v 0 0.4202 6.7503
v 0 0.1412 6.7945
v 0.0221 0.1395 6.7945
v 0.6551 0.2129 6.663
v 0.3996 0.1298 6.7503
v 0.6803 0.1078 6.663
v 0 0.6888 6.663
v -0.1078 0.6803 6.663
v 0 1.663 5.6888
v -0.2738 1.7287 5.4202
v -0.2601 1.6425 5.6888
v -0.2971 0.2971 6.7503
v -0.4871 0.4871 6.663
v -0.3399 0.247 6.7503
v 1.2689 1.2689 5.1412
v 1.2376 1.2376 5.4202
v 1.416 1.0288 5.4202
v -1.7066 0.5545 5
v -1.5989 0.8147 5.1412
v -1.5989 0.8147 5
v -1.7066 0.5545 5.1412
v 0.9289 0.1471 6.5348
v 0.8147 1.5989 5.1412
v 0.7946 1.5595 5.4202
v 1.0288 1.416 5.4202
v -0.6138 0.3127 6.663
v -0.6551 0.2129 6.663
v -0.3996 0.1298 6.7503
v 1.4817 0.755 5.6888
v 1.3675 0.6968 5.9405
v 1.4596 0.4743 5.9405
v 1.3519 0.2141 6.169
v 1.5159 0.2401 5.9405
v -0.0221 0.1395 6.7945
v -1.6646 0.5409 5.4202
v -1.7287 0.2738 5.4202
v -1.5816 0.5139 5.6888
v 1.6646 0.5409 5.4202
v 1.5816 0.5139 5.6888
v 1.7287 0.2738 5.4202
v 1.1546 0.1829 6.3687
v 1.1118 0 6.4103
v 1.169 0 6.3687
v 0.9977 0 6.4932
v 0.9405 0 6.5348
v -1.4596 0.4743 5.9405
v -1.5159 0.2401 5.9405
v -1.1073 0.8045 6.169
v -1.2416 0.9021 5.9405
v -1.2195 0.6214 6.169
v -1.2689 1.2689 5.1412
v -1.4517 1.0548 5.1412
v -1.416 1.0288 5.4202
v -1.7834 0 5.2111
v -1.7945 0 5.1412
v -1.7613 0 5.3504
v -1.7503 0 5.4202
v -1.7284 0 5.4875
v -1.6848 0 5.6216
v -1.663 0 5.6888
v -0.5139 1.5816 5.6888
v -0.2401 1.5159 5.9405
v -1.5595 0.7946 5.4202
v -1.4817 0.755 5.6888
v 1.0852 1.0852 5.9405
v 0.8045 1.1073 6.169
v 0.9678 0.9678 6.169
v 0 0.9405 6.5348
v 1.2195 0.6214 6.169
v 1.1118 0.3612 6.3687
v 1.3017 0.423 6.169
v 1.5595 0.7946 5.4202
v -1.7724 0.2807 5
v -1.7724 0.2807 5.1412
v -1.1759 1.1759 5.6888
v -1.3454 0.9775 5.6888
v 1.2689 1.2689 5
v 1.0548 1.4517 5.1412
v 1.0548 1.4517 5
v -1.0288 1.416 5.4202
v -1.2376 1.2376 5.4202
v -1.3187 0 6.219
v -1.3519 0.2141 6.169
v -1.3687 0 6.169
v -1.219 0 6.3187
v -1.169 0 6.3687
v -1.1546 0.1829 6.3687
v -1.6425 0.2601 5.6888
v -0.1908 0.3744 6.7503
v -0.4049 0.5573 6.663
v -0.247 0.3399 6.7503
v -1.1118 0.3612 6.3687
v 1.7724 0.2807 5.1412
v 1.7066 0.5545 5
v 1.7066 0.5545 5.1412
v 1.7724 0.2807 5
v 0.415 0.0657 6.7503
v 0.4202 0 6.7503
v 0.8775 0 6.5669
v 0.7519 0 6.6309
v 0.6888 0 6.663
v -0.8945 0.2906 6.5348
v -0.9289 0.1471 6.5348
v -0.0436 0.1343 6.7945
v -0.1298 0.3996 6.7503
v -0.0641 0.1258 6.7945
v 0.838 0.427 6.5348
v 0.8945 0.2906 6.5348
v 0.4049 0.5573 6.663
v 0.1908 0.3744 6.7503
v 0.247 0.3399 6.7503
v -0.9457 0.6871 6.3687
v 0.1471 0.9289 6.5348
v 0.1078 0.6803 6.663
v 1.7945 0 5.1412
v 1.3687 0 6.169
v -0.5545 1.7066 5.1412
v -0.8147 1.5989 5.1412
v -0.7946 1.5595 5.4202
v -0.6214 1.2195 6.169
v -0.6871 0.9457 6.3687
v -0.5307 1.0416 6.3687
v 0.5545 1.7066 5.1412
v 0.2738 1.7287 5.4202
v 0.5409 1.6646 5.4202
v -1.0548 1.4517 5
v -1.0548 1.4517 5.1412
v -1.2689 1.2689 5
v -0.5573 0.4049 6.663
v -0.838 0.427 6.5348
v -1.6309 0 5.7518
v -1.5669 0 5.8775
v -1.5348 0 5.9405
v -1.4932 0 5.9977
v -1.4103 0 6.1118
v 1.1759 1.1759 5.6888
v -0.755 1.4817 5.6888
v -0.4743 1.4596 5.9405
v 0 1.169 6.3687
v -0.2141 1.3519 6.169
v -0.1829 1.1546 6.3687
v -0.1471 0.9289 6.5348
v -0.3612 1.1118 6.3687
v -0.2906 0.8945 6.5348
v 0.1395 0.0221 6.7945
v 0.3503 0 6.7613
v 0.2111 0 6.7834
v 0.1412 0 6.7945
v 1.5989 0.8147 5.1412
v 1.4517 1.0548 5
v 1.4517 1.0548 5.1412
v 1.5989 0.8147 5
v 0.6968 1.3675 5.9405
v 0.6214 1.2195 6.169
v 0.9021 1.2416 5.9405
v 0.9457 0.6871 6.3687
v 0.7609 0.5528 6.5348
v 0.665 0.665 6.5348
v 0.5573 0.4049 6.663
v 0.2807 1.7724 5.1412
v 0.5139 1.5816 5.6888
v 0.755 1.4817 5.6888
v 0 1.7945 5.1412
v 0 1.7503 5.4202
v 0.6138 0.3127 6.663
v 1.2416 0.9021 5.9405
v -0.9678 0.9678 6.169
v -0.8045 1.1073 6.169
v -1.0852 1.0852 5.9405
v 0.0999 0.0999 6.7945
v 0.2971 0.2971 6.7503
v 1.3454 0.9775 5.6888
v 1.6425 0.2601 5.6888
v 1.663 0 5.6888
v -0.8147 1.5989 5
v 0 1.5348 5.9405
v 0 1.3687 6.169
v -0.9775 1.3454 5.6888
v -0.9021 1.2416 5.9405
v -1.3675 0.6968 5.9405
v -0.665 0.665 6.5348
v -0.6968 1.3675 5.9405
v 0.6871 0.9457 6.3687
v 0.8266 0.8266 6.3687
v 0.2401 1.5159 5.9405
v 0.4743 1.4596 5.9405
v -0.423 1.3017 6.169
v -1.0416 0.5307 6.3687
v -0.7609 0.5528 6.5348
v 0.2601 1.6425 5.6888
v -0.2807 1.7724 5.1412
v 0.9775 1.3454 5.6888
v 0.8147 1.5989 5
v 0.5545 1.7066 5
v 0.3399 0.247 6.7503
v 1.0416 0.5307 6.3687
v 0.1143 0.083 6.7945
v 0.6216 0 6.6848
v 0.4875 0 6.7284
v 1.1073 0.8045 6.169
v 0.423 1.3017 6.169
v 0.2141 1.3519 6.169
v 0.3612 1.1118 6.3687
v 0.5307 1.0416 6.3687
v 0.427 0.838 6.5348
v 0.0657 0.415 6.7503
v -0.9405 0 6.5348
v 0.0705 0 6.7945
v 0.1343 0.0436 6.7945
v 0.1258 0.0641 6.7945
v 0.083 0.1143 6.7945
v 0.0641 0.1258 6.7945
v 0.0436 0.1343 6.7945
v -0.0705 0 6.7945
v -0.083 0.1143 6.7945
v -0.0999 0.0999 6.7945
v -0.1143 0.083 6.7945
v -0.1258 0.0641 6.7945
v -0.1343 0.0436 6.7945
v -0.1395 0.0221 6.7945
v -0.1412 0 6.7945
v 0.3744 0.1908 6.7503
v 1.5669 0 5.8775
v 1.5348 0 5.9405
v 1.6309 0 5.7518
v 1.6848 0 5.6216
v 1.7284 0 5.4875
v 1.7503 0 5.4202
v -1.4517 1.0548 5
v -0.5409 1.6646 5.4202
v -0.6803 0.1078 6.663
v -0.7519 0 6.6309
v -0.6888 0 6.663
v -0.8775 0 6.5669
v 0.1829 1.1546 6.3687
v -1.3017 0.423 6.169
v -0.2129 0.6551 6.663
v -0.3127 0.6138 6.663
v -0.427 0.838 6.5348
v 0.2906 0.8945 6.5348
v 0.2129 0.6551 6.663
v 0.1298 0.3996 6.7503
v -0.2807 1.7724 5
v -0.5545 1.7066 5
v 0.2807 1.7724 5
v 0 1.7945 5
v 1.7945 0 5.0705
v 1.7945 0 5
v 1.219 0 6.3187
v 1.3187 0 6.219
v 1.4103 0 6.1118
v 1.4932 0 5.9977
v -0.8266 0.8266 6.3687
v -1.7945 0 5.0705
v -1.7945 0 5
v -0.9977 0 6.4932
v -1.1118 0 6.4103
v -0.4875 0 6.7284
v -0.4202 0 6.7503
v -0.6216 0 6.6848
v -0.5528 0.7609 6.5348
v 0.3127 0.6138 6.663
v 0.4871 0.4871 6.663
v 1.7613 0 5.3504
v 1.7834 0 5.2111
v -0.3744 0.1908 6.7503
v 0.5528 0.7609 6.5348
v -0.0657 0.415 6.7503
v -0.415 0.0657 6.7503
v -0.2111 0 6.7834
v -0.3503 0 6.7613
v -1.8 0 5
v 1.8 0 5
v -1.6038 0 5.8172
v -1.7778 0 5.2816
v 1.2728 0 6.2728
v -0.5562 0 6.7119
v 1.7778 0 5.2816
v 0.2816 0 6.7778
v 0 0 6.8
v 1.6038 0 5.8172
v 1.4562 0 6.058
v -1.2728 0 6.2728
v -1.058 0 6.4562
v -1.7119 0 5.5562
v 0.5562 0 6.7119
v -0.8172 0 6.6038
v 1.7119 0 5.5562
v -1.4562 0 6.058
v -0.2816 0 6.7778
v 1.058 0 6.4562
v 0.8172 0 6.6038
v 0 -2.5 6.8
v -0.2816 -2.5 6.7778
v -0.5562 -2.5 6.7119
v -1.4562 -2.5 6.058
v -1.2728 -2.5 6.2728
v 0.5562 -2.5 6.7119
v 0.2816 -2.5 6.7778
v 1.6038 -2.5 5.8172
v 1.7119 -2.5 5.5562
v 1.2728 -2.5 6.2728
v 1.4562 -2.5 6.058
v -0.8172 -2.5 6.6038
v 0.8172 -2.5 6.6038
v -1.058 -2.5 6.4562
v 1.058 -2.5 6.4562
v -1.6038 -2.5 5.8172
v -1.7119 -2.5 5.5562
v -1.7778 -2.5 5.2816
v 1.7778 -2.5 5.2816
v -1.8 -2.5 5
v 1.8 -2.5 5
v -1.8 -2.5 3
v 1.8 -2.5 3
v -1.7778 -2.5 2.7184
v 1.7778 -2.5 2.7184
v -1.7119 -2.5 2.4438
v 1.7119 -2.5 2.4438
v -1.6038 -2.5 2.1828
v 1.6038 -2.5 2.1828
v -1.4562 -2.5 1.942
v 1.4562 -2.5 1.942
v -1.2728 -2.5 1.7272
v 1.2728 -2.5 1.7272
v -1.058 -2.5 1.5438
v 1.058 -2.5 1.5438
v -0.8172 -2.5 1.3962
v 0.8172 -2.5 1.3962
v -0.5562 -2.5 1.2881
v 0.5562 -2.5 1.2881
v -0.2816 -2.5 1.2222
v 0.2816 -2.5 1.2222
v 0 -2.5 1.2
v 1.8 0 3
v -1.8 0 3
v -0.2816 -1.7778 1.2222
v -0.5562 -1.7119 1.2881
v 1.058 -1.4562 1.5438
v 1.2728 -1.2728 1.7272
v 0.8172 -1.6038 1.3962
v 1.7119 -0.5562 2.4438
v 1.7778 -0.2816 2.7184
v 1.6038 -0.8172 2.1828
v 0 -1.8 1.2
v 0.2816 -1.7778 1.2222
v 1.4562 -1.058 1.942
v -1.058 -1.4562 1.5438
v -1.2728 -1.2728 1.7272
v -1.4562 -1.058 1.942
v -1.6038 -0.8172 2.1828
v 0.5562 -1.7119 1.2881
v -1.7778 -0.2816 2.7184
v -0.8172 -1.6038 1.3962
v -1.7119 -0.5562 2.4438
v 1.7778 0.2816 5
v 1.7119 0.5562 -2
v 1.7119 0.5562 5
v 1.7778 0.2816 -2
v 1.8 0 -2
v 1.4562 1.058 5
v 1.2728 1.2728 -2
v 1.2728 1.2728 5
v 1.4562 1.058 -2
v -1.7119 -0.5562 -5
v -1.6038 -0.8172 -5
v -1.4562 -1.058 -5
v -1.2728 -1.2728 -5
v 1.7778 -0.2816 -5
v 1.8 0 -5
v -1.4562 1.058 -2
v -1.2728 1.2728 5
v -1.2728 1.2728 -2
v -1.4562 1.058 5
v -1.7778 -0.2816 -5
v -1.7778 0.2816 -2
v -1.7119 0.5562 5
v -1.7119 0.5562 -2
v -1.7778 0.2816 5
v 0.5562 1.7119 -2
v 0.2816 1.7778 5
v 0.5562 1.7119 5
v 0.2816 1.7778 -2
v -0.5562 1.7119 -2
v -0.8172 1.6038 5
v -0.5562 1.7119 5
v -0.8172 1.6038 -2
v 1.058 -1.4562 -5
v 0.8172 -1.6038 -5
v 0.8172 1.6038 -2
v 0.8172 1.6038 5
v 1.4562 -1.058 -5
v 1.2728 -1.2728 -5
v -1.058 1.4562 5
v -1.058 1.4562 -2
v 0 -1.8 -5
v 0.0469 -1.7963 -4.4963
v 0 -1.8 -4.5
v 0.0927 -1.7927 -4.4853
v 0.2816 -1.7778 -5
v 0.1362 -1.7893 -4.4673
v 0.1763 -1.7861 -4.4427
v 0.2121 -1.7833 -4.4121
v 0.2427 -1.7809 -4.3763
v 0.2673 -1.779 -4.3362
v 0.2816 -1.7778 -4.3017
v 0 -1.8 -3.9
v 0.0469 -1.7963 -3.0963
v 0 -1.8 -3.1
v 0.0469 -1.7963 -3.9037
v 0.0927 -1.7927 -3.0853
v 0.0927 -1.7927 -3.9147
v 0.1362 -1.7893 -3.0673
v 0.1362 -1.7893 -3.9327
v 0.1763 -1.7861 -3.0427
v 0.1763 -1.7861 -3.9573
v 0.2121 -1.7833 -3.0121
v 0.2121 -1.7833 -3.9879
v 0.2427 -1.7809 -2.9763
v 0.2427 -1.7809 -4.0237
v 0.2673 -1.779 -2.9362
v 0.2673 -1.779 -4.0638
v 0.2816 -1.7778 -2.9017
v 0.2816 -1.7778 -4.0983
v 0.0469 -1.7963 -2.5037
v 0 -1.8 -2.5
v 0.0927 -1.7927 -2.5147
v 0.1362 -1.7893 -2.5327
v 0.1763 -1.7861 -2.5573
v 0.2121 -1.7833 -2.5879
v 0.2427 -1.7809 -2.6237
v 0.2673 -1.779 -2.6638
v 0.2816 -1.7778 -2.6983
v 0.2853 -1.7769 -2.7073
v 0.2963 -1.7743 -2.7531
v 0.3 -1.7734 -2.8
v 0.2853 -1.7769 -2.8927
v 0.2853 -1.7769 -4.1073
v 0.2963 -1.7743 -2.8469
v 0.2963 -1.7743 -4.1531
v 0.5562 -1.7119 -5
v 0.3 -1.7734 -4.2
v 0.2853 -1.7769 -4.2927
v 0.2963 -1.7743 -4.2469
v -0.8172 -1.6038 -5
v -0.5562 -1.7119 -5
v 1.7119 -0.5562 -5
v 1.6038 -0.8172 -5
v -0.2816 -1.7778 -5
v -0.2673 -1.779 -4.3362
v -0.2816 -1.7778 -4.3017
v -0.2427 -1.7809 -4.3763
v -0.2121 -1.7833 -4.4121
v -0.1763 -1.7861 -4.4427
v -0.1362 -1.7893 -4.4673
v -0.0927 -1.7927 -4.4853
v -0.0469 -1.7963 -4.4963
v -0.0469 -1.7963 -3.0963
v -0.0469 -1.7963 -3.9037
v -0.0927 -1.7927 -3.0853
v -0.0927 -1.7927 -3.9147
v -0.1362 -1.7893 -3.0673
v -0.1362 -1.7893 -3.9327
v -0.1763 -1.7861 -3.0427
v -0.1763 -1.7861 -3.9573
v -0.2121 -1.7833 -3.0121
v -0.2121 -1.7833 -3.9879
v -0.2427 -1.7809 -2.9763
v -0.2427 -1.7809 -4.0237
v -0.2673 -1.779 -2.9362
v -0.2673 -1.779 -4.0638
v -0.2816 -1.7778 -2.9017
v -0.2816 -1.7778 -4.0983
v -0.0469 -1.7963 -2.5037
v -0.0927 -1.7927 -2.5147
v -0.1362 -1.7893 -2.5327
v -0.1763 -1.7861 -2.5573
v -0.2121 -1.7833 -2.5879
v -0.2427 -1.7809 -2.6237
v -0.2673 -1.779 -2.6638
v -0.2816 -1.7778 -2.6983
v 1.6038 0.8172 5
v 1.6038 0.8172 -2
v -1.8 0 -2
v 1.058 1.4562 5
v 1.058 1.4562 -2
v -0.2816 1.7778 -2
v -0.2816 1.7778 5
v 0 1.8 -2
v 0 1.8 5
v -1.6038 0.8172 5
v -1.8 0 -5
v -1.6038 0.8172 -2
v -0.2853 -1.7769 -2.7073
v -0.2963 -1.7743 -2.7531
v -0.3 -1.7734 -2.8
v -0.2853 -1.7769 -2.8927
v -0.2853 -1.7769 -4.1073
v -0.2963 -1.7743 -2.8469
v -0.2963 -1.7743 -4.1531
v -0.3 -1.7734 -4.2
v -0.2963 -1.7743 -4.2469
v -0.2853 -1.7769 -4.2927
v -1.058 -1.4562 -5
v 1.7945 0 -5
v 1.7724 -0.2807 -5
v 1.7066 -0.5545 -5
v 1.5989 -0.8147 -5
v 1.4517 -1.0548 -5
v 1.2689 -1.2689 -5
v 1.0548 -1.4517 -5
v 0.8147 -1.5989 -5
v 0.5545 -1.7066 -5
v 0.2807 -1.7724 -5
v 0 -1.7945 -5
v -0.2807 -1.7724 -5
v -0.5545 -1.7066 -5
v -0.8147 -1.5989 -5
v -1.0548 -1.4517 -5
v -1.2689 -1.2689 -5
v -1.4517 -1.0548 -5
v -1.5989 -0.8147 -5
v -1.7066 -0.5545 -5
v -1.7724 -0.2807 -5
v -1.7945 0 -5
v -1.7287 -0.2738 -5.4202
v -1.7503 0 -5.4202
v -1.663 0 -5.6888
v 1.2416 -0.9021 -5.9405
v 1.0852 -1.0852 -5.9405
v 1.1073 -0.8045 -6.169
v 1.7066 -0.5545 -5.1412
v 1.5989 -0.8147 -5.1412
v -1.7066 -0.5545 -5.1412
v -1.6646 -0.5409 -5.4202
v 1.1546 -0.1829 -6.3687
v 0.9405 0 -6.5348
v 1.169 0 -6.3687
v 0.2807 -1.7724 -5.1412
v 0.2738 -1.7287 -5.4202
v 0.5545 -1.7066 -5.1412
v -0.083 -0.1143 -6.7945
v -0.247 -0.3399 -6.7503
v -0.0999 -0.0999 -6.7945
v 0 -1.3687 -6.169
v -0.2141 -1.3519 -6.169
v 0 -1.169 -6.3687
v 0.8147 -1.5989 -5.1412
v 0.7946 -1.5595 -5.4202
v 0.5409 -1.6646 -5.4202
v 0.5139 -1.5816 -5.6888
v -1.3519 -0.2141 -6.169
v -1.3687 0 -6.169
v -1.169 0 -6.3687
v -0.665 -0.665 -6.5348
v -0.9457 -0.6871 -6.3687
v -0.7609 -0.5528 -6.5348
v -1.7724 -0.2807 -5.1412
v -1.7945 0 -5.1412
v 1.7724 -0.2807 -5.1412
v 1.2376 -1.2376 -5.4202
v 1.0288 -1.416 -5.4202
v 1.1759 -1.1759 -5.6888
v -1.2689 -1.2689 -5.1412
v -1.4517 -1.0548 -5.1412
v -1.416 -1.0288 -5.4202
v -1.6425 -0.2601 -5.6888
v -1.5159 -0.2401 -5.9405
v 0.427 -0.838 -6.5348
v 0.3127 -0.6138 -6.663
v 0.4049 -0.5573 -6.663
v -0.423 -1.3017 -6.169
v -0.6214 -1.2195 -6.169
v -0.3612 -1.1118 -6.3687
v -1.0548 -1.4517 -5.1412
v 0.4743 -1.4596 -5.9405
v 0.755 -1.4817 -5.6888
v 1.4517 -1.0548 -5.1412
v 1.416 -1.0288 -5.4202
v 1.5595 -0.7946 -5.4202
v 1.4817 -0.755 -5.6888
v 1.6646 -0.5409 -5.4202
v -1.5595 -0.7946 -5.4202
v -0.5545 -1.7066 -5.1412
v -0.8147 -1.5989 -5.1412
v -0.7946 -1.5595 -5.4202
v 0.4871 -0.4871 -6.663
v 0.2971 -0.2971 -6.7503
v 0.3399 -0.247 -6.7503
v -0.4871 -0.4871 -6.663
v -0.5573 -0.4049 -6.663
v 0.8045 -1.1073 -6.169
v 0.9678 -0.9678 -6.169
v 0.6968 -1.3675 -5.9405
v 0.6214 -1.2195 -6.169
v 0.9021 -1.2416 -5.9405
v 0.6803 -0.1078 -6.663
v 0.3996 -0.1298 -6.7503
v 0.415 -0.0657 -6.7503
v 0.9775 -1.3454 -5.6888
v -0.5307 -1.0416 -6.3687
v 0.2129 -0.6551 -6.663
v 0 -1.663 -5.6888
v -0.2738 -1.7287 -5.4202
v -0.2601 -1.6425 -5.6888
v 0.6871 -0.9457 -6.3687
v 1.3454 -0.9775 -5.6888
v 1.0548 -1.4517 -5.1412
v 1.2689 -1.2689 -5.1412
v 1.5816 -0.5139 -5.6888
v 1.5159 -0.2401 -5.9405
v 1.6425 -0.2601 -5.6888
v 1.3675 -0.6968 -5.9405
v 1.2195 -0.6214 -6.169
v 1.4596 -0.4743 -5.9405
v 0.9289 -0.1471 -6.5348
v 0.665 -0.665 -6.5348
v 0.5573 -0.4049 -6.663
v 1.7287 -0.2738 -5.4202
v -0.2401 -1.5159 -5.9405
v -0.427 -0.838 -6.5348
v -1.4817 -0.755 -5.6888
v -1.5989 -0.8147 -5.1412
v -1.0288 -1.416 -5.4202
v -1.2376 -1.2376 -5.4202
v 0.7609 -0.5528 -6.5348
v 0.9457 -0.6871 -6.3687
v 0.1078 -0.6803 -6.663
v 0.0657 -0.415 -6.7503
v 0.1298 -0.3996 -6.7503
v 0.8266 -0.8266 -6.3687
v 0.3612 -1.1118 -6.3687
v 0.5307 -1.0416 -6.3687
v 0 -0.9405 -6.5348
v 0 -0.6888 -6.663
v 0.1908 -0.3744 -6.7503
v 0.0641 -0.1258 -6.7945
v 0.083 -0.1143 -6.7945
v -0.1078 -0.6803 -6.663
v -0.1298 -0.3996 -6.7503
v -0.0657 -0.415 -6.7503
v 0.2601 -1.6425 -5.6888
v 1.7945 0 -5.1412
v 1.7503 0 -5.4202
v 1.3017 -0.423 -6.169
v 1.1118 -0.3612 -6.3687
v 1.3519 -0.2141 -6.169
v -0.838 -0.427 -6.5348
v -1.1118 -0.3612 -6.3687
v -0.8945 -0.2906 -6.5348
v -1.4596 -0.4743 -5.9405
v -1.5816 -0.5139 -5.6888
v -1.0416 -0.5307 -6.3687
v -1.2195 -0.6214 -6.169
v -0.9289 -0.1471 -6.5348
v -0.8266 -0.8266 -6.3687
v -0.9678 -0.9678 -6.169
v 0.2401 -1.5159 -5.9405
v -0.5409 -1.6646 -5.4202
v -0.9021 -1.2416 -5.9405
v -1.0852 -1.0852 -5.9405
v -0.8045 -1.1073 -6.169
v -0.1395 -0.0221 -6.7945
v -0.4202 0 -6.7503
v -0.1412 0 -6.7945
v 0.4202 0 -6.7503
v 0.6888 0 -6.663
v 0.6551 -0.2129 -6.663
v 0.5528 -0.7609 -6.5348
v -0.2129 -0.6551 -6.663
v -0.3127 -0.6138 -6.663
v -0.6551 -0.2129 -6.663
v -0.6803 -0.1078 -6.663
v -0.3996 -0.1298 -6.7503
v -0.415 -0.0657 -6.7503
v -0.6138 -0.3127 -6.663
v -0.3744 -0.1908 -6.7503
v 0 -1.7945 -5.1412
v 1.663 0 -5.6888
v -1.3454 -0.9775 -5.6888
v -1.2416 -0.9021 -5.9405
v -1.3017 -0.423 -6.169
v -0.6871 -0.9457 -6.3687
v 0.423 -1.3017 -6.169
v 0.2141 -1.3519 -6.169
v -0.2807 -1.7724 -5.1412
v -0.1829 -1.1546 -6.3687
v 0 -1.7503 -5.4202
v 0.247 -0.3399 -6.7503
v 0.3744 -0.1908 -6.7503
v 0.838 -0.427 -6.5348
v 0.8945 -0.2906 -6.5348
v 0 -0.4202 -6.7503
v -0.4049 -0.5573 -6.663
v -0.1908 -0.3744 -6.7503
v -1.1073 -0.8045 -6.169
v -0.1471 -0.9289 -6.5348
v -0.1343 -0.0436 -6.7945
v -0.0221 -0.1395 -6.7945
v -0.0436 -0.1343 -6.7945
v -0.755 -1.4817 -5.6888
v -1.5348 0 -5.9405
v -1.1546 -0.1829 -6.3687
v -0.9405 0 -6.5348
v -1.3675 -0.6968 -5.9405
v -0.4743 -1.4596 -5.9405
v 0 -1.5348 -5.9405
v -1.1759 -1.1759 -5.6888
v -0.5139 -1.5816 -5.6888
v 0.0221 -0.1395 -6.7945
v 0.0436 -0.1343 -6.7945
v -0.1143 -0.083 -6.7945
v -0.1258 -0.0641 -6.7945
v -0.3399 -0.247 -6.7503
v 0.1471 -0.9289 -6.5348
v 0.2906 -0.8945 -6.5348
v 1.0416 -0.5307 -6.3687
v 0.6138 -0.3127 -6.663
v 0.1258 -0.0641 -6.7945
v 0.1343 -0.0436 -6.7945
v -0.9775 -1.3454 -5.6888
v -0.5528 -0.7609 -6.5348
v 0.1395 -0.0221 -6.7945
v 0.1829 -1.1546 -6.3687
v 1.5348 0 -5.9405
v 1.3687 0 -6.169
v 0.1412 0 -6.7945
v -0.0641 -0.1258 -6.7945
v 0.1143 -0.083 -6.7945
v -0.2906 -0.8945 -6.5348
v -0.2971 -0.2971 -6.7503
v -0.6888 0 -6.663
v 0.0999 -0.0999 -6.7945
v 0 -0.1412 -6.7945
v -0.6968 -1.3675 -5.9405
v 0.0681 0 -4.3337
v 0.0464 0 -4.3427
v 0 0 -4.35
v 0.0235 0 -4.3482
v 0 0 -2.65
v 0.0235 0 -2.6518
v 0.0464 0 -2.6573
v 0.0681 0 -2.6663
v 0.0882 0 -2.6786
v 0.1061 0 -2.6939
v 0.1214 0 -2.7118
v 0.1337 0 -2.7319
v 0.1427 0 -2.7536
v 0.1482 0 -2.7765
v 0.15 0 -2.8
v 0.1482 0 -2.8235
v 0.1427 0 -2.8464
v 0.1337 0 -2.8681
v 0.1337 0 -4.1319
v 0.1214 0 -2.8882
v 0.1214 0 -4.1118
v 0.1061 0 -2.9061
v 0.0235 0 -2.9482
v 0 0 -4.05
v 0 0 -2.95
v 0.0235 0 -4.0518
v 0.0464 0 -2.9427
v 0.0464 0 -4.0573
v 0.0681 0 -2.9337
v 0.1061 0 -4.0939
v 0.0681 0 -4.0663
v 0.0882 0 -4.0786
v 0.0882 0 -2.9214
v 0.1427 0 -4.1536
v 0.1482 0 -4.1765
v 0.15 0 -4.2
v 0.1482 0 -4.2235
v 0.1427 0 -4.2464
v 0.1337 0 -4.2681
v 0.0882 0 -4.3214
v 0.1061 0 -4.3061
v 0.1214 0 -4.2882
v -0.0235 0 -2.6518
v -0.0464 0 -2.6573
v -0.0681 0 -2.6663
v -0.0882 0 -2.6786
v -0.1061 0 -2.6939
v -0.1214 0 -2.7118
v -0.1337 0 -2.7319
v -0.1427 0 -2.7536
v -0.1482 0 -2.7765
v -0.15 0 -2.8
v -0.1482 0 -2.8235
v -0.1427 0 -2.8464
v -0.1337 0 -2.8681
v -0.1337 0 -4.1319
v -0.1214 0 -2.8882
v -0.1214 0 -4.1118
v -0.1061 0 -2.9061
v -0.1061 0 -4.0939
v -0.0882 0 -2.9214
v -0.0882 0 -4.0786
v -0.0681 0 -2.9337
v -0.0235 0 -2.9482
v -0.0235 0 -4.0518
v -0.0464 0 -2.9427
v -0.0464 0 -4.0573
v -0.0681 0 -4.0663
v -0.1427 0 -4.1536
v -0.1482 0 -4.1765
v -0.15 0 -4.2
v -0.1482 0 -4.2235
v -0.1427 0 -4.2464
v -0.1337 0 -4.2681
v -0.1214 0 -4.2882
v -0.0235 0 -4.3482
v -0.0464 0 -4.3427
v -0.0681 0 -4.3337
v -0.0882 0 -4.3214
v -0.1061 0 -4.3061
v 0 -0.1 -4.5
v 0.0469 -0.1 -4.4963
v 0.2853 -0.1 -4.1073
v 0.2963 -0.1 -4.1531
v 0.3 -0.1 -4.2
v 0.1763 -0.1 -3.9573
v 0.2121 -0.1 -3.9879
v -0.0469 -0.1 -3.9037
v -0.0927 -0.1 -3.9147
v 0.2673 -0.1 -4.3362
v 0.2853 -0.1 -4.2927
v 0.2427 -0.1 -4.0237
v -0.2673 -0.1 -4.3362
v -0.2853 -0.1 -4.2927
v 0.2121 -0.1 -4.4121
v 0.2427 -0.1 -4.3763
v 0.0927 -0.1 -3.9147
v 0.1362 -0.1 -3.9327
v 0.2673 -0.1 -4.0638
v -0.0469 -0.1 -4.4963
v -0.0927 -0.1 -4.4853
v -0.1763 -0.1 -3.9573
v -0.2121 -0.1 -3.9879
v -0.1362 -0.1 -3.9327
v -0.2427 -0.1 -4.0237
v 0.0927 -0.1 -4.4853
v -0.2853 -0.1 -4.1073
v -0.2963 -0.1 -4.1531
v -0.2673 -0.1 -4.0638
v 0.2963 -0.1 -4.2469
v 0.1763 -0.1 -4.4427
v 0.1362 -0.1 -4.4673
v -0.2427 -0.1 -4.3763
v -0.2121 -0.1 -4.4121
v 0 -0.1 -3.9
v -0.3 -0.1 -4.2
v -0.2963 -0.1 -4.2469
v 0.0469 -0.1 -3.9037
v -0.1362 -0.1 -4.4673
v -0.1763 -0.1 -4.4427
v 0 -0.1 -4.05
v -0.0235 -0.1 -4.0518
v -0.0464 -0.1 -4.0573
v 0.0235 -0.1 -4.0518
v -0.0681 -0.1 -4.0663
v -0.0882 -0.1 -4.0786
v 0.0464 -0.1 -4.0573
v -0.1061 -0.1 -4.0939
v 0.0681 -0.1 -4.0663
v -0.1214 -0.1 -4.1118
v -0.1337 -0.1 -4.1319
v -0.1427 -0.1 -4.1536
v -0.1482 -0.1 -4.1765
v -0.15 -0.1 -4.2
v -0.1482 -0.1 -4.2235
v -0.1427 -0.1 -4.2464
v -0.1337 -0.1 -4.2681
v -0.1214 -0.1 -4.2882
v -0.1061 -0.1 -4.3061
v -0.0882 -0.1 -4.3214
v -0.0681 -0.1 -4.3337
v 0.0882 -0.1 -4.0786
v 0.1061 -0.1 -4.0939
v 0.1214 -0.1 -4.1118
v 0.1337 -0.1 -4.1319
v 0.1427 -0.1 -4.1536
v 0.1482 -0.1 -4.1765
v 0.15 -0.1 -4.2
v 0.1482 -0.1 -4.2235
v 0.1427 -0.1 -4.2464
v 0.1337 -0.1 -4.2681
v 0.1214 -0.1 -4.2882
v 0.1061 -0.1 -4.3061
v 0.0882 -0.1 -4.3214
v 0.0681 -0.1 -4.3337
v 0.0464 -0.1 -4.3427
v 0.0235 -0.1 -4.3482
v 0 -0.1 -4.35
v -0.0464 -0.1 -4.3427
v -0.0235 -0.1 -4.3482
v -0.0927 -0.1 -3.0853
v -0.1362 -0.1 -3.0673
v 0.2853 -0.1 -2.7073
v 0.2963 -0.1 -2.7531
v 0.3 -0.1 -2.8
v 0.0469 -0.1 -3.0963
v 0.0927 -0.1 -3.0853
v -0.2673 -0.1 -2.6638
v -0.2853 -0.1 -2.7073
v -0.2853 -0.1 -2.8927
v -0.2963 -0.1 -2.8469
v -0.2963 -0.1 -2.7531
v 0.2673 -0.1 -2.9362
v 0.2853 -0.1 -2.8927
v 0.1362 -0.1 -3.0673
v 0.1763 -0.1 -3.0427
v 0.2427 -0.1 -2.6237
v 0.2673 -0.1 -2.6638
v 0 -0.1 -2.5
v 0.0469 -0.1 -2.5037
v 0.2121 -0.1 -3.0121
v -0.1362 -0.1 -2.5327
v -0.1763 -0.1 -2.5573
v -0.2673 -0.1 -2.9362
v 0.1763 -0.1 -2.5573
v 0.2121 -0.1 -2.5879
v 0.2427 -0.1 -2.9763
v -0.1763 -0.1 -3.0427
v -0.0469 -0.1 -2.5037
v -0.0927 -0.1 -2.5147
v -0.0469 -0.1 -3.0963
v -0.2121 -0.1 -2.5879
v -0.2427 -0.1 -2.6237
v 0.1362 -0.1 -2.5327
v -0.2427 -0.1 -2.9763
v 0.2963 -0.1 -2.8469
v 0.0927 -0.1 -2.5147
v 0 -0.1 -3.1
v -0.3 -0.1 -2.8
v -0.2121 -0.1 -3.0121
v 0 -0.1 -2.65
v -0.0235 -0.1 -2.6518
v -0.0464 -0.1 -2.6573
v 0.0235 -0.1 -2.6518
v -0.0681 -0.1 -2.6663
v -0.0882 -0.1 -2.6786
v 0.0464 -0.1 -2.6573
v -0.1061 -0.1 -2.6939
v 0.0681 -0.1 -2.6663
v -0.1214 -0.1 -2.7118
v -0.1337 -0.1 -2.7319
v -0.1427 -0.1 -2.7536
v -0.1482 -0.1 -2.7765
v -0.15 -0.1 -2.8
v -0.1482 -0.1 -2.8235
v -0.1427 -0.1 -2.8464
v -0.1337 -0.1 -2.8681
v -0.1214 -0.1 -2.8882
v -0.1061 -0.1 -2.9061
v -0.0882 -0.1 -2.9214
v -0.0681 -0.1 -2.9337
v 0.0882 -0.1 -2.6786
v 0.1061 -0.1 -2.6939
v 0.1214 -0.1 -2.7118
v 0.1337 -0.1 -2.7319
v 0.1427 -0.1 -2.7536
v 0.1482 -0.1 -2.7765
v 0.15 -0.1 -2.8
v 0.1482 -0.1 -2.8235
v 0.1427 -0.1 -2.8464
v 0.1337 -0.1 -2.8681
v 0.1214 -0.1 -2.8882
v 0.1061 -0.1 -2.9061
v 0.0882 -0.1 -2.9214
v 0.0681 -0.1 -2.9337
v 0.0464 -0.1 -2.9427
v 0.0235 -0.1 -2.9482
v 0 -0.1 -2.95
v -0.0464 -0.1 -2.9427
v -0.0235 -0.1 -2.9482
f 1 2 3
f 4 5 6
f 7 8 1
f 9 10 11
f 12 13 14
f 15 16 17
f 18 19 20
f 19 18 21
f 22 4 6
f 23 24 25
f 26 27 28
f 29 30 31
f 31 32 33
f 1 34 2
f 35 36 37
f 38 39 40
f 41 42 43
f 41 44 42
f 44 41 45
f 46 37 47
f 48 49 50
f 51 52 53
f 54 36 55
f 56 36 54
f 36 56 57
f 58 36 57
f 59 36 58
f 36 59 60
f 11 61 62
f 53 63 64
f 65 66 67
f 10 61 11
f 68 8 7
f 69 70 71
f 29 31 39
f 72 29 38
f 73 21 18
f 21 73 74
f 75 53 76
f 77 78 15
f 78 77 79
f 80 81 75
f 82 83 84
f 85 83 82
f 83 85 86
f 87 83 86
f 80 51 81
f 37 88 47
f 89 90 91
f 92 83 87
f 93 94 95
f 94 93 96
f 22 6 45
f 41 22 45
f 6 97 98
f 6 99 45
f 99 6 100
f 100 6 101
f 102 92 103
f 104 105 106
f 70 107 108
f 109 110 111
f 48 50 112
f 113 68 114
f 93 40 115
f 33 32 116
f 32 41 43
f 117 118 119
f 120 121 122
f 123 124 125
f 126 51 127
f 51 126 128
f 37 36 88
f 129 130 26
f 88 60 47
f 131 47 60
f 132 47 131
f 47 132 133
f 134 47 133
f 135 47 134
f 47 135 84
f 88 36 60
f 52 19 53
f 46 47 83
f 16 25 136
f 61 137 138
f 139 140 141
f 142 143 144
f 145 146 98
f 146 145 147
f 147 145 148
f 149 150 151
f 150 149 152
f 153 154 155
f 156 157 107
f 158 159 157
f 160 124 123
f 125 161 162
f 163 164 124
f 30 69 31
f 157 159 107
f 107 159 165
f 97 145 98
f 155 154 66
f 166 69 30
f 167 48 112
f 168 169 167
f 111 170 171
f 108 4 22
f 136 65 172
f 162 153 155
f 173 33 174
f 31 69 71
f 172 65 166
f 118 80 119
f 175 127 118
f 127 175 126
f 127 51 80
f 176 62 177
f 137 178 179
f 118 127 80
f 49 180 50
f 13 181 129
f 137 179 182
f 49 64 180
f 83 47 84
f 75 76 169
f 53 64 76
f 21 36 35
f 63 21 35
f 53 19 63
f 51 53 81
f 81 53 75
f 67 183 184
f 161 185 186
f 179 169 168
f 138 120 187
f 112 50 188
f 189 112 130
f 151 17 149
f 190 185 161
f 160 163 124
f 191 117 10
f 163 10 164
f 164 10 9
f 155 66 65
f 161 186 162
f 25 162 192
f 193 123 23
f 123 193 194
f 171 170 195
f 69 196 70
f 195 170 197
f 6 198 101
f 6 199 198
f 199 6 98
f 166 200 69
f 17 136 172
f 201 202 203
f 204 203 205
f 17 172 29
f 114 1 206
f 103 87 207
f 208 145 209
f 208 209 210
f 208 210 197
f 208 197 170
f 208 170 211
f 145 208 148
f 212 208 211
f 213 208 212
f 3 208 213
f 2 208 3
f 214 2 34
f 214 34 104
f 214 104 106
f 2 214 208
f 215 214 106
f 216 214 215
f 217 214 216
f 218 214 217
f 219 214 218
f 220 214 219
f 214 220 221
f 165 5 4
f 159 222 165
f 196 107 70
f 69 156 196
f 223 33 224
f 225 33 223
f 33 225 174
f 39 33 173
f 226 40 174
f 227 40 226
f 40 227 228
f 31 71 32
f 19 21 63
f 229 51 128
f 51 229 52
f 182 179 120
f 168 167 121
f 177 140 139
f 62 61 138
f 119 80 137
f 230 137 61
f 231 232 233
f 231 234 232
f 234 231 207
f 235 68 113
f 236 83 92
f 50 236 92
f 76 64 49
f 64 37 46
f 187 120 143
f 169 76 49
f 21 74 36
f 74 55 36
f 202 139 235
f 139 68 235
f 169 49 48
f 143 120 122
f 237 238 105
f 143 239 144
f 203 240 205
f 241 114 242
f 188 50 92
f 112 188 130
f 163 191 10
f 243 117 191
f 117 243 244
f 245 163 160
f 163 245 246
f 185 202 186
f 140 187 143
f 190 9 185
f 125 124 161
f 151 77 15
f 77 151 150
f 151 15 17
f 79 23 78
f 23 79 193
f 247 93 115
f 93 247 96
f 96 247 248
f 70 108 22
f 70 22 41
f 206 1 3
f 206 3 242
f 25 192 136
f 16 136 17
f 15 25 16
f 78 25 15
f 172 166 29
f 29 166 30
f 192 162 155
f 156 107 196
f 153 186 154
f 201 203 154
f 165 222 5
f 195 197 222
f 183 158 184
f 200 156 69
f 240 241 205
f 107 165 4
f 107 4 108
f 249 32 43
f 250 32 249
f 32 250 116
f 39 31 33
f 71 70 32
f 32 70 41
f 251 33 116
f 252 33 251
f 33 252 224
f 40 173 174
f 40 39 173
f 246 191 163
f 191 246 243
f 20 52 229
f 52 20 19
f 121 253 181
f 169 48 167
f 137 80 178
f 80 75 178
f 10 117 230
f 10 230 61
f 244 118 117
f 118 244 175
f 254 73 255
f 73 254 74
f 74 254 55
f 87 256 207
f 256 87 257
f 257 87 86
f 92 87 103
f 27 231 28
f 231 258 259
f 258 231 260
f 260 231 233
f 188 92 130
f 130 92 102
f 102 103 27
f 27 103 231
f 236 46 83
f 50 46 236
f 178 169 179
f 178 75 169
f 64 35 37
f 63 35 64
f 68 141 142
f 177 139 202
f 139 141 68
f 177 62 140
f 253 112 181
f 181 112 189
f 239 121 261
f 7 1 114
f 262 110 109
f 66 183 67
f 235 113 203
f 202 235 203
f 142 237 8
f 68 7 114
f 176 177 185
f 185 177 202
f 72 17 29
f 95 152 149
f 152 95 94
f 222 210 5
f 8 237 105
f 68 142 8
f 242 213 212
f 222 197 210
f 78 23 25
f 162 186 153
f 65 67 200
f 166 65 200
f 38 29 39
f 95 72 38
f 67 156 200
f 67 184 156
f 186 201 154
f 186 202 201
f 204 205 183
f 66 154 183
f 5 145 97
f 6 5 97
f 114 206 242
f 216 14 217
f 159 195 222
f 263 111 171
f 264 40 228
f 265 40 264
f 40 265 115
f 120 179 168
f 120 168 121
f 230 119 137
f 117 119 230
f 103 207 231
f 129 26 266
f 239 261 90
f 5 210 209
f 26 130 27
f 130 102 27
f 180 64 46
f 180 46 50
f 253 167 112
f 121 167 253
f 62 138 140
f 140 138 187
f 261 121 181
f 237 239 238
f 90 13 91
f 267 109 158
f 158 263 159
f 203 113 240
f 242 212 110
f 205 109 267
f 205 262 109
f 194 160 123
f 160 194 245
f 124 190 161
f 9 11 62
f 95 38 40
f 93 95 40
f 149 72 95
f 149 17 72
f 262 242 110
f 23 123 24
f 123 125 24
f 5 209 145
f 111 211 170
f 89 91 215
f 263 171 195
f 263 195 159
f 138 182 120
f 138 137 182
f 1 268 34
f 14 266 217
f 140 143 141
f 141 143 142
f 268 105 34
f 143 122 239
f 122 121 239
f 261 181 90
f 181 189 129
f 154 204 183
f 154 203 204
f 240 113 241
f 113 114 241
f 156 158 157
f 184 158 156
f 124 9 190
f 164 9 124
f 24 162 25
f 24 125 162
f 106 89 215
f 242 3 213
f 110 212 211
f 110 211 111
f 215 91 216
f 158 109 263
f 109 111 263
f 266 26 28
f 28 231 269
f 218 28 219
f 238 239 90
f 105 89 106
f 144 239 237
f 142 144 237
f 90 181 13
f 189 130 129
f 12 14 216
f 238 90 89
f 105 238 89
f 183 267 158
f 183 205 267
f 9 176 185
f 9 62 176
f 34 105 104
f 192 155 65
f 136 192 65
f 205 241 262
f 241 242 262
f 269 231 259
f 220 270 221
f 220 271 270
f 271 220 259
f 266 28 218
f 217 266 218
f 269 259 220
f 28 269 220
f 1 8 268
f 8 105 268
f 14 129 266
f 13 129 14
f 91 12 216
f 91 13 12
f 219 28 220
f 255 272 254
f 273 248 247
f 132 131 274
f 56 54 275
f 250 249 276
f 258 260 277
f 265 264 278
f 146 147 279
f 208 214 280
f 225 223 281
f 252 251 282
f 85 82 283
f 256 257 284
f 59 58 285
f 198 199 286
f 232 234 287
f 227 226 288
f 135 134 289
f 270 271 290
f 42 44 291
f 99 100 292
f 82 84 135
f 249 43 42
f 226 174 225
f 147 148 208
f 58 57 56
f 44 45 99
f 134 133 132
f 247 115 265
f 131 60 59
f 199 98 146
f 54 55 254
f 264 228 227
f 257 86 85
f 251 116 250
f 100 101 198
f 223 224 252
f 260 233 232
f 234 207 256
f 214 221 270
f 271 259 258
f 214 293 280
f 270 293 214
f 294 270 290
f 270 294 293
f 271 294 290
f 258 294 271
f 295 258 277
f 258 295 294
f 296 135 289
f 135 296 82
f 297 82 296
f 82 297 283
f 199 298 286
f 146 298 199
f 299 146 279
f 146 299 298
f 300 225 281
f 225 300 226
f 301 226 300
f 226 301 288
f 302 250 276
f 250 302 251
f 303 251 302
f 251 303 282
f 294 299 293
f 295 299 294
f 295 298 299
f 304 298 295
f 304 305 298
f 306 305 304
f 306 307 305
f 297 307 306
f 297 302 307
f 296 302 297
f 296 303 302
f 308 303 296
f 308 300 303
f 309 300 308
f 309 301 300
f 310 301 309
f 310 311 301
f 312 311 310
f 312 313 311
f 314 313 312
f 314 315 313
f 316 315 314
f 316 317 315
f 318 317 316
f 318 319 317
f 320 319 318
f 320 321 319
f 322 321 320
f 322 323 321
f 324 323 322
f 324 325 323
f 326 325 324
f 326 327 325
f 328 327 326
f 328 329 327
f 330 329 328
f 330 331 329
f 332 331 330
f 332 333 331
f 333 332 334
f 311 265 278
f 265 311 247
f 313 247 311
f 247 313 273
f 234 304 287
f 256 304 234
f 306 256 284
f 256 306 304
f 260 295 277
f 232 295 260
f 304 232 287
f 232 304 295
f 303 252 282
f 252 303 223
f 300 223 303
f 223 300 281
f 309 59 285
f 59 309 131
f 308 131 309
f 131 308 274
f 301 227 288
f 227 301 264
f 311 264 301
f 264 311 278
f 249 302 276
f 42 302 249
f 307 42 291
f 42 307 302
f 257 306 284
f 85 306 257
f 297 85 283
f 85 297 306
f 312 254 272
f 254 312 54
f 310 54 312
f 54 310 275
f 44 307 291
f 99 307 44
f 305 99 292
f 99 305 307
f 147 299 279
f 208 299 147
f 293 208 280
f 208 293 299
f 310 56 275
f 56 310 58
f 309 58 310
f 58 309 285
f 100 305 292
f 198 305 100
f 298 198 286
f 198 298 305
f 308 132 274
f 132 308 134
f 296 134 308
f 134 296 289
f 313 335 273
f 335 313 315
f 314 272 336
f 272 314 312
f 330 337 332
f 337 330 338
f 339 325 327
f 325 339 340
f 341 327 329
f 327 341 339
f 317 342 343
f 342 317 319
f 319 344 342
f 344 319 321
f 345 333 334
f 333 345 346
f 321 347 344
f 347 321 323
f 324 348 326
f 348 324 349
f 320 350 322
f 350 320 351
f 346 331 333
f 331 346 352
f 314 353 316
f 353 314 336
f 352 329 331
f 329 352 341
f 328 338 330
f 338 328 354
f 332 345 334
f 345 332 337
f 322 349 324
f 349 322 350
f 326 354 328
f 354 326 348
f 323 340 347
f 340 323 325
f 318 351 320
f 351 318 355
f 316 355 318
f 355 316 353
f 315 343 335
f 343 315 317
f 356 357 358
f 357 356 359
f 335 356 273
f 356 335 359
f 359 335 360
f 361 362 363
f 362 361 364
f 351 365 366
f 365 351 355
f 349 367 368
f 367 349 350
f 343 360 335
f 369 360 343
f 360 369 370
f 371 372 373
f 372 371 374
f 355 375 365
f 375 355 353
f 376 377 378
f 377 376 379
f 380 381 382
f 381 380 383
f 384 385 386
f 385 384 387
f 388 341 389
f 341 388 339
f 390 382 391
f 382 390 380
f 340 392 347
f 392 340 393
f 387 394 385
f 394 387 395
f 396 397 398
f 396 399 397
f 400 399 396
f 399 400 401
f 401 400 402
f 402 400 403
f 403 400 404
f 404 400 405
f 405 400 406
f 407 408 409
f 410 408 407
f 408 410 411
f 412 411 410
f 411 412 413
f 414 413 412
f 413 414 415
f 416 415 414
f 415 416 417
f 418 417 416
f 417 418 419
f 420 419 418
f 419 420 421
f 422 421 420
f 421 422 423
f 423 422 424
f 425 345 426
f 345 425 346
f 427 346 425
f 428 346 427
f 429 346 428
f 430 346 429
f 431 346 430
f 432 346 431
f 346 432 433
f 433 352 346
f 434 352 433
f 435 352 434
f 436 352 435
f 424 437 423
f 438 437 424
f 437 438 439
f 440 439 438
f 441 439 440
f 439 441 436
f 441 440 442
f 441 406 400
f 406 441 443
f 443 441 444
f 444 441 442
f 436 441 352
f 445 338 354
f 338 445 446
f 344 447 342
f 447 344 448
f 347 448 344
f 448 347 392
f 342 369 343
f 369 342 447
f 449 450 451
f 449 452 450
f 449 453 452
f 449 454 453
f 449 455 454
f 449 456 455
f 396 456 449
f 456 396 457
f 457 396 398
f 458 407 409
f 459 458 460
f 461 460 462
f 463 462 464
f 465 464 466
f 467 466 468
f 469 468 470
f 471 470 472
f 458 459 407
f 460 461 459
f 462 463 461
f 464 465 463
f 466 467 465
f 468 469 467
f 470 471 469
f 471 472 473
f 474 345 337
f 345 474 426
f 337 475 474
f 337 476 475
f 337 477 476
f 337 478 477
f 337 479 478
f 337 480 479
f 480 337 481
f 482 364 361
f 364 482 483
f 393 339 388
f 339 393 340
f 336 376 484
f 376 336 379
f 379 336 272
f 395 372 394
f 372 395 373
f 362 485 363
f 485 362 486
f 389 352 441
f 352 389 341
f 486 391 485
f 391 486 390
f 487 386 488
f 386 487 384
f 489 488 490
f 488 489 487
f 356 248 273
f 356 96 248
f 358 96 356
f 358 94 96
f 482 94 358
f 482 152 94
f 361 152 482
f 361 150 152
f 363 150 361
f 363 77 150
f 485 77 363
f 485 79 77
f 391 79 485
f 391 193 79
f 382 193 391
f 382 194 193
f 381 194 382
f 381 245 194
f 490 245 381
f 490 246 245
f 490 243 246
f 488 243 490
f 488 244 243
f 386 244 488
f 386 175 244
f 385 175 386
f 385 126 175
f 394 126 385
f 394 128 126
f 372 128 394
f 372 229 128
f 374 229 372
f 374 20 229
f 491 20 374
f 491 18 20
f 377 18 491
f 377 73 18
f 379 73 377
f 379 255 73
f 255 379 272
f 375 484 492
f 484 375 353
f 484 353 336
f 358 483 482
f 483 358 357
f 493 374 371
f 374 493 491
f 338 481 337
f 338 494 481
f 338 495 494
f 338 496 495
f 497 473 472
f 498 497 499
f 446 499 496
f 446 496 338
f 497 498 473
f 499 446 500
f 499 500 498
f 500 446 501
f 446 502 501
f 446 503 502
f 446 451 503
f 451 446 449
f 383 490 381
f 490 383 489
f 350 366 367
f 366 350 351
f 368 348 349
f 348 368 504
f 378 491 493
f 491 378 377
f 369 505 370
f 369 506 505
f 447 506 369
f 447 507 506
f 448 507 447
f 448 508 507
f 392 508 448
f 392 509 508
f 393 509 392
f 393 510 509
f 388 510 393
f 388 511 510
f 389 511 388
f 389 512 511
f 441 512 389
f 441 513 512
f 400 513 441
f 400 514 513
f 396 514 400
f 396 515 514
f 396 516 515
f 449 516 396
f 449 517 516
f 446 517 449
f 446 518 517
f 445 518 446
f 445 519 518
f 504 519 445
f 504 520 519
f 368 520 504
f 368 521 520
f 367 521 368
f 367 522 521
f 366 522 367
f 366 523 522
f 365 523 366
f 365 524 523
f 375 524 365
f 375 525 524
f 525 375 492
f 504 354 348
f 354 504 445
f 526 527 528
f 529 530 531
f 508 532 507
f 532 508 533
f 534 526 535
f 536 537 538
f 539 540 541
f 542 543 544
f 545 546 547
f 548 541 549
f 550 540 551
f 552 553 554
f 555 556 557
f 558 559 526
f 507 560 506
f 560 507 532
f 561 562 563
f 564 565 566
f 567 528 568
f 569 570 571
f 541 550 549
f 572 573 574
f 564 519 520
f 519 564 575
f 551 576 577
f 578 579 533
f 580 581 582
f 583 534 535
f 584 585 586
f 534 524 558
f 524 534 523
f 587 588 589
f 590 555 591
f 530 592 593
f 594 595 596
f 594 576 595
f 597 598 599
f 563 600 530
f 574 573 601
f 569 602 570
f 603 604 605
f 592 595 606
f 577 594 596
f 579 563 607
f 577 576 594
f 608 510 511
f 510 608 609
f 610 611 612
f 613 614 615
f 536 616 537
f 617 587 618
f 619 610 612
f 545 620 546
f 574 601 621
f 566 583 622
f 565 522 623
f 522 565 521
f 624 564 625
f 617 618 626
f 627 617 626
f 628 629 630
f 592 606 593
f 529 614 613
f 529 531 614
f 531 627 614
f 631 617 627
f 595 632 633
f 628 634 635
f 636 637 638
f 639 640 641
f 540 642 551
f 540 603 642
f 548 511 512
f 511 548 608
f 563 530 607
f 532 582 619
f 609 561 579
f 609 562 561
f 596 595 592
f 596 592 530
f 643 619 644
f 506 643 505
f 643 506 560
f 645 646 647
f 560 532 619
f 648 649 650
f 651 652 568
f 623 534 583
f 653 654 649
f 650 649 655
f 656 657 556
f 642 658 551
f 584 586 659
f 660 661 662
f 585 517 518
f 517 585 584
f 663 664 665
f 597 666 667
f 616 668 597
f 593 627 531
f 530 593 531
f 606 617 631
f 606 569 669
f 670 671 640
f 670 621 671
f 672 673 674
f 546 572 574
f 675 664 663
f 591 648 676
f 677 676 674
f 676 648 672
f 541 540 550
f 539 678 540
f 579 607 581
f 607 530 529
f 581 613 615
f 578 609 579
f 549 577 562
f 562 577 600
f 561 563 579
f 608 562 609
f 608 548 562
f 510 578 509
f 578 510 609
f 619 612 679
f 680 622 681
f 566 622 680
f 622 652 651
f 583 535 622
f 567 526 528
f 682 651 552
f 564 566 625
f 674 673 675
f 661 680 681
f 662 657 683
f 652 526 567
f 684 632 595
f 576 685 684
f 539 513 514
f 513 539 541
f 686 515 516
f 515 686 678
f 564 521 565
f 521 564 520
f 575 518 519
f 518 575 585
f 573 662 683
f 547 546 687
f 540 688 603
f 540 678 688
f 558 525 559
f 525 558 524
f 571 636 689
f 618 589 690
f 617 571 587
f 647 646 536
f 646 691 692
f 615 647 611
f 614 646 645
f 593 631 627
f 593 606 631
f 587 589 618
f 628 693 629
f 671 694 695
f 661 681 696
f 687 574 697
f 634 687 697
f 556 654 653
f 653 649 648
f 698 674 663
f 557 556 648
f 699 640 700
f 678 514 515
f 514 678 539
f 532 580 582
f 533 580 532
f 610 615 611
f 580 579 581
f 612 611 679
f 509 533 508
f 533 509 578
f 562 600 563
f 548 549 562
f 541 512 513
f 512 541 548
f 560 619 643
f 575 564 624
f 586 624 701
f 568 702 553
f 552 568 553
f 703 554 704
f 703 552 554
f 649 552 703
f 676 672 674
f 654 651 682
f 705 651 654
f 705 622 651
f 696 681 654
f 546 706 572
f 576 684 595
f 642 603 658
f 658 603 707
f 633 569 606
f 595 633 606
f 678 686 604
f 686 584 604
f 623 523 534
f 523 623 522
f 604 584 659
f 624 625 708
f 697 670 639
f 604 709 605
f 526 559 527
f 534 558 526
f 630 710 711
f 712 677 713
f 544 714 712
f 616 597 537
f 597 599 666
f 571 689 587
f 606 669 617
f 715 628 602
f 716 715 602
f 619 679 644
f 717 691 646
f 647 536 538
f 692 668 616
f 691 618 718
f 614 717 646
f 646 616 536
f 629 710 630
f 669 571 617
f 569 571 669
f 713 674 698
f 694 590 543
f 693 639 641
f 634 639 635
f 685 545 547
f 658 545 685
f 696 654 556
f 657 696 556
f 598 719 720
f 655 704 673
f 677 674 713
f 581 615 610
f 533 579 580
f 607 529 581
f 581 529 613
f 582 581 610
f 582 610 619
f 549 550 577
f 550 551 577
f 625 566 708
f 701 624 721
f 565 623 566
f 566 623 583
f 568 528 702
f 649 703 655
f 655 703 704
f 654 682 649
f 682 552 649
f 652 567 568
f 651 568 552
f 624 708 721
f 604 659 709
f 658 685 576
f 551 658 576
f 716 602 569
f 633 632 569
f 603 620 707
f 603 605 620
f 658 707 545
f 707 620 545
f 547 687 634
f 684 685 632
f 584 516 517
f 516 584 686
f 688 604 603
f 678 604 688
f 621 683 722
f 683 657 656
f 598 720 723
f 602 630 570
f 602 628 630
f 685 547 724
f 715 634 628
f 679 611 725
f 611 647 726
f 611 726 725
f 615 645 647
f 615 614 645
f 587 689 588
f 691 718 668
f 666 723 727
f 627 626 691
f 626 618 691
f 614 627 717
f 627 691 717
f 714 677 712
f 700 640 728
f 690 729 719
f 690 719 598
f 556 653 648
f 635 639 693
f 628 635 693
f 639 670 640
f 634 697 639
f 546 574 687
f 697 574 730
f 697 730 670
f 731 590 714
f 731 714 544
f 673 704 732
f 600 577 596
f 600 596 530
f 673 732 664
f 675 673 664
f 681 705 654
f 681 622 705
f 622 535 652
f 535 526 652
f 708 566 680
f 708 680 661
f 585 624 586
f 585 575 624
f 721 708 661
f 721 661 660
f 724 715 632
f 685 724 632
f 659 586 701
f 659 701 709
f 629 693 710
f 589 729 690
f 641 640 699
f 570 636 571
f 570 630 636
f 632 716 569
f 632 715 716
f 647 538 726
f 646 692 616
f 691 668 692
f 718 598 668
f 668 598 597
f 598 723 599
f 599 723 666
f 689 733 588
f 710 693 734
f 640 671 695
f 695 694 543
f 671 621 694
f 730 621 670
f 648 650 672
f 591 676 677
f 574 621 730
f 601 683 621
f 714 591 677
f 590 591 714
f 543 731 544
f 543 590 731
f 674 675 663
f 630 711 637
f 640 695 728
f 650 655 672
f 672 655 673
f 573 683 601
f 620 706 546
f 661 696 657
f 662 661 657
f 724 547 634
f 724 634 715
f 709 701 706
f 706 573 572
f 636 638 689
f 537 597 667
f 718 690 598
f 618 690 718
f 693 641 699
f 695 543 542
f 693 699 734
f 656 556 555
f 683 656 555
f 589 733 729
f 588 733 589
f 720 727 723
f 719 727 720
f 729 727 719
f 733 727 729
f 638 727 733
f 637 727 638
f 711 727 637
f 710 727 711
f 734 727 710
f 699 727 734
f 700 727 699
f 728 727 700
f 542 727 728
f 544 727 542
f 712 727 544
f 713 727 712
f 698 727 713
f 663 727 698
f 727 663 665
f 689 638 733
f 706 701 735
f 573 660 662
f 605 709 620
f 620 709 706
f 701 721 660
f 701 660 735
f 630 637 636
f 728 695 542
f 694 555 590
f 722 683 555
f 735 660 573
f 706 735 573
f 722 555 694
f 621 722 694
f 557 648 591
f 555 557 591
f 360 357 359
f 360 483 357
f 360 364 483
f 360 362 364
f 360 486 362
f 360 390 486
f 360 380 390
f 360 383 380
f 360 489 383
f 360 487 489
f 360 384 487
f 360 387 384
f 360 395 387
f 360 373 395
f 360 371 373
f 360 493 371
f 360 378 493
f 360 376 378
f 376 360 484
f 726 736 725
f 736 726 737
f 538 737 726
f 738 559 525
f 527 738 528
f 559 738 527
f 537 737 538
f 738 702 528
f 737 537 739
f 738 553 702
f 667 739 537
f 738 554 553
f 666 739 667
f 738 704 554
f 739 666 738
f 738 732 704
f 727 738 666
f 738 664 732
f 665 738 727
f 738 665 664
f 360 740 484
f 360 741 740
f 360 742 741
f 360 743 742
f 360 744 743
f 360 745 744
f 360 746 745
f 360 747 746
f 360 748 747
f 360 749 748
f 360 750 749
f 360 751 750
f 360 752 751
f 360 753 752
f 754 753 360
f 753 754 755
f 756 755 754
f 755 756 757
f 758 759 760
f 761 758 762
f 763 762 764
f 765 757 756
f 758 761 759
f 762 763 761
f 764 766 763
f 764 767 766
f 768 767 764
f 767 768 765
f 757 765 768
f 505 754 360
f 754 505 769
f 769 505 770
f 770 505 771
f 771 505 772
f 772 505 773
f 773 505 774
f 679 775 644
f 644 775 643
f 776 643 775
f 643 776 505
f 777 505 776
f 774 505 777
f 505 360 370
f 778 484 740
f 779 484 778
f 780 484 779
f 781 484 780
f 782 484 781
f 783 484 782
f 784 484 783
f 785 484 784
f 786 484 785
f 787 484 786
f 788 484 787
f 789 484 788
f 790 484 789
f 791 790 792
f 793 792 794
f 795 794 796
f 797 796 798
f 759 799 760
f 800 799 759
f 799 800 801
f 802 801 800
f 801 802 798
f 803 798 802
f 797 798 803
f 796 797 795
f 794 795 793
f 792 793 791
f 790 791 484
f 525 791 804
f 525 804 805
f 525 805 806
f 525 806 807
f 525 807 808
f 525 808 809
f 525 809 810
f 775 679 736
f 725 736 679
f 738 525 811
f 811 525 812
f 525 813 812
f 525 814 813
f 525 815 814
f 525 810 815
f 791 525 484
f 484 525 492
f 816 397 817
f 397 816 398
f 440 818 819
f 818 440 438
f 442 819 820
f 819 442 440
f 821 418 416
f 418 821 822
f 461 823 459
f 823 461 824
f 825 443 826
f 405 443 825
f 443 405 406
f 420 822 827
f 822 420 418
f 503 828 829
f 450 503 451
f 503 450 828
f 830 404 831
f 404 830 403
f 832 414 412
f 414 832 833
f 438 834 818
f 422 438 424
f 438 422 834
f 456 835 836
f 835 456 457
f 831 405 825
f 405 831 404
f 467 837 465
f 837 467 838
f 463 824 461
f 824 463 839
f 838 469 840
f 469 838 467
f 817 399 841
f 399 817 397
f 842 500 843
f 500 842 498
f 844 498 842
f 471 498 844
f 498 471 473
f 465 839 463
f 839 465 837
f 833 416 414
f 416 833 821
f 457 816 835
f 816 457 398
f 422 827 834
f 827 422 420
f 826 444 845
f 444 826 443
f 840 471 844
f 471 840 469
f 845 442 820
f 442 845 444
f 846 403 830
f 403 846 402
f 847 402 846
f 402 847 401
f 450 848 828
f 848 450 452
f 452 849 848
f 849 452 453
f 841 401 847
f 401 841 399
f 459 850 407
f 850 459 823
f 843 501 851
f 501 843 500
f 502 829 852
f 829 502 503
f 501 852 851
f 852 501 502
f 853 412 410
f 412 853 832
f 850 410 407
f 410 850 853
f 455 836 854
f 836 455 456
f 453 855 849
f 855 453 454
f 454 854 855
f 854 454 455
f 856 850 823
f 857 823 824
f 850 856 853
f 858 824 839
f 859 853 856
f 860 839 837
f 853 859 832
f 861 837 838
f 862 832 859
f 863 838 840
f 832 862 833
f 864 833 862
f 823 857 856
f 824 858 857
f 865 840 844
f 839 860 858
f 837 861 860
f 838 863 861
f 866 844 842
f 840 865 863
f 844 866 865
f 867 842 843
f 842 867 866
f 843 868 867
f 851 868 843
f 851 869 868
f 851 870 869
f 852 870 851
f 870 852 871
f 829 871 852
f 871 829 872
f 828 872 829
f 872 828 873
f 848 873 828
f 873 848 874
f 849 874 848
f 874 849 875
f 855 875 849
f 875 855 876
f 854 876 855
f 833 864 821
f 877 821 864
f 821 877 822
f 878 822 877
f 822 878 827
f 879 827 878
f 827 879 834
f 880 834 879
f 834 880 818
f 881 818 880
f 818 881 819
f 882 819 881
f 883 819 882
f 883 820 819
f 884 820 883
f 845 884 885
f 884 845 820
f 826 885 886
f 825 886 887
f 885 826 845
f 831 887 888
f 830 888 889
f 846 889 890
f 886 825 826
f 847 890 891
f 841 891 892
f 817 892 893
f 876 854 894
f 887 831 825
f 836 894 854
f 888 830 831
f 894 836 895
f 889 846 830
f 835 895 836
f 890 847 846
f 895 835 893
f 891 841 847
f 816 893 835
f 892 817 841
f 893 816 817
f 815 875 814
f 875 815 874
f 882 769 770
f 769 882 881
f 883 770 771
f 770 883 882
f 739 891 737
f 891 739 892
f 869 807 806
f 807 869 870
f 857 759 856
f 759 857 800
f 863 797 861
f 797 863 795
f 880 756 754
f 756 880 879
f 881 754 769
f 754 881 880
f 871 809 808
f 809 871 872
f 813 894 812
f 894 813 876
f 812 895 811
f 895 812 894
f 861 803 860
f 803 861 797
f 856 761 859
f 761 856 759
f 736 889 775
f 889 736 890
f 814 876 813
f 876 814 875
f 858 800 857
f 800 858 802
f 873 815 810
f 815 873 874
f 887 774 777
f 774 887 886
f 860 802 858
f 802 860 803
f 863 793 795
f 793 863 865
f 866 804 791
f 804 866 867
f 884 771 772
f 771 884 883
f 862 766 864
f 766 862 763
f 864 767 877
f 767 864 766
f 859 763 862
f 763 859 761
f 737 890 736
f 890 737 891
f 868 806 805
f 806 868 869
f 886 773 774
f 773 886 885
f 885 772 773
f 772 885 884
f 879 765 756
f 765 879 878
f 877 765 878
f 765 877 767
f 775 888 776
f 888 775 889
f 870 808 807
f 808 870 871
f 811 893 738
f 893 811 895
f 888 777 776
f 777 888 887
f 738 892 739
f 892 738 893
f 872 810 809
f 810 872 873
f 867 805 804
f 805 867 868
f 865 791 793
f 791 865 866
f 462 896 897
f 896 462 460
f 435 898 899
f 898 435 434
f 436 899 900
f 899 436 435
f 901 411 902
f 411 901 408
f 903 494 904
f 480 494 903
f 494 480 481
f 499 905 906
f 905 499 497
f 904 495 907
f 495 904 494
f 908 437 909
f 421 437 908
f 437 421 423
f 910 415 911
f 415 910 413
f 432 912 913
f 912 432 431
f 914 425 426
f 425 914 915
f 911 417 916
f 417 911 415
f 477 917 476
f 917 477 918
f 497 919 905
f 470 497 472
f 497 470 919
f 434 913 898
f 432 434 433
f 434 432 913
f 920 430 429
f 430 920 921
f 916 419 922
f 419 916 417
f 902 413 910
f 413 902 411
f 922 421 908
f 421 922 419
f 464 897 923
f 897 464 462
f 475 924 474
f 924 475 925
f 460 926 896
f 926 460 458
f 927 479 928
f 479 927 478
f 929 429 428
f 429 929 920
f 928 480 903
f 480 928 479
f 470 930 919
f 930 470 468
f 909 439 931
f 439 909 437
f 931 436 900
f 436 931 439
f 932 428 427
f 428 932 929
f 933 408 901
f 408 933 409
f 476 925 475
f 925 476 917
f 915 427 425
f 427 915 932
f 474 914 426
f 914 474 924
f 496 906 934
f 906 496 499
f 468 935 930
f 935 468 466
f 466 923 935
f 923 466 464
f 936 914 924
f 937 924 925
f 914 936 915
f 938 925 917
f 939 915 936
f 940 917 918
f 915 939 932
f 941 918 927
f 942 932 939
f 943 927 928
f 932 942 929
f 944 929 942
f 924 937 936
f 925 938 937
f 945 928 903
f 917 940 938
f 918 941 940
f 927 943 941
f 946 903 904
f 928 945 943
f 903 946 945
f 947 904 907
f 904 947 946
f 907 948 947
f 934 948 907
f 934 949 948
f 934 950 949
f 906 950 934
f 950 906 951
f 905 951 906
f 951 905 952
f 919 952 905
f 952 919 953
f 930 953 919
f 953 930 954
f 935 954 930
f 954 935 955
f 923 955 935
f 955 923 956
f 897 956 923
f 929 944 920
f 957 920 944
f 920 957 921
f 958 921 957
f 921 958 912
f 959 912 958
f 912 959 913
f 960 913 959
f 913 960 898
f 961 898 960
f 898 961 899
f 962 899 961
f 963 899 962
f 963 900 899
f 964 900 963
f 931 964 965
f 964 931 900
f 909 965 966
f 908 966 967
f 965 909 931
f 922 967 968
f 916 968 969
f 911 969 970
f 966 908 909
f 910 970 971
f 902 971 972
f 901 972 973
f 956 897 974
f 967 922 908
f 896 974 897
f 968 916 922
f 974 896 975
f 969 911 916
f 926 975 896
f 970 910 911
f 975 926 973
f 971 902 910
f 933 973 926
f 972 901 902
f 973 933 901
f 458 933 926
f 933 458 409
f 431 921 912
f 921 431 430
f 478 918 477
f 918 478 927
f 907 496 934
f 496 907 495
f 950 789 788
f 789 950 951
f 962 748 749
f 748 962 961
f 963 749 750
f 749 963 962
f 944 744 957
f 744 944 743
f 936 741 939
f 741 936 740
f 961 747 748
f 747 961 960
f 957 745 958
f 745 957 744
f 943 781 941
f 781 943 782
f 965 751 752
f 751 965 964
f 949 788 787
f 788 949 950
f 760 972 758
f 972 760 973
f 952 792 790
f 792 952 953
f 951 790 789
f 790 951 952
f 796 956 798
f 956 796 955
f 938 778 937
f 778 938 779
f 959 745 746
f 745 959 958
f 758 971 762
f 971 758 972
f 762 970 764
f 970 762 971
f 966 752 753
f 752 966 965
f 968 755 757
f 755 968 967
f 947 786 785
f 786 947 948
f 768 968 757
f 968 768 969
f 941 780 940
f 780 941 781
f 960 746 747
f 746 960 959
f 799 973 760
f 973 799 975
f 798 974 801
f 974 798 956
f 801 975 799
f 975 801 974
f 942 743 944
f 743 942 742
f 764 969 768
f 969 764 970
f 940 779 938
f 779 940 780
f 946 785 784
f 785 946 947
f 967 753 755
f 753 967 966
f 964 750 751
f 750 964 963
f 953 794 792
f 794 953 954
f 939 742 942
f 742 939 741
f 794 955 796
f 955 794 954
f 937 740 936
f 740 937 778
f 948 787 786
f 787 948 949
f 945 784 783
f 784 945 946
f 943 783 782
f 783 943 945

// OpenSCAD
// Rounding of hip attchment
translate([0,0,10]) rotate([0,0,180]) difference() {
    translate([0,0,-5]) sphere(r=1.8, $fn=40);
    translate([0,2.2,-6]) cube([4.6, 4.4, 6], center=true);
}

// The top hip attachment
translate([0,0,5]) union() {
    rotate([90,90,0]) cylinder(h=2.5, r=1.8, $fn=40);
    translate([-1.8,-2.5,-2]) cube([3.6,2.5,2]);
    translate([0,0,-2]) rotate([90,90,0]) cylinder(h=2.5, r=1.8, $fn=40);

}

// Main leg part & lower knee attachment
difference() {
    union() 
    {
        cylinder(h=10, r2=1.8, r1=1.8, $fn=40, center=true);
        translate([0,0,-5]) sphere(r=1.8, $fn=40);
    }
    // Removes hemisphere from bottom of leg
    translate([-1.8,0,-7]) cube([3.6, 4.4, 5]);
    // Holes for servo screws
    translate([0,-0.1,-4.2]) rotate([90,0,0]) cylinder(h=1.8, r=0.3, $fn=40);
    translate([0,0.1,-4.2]) rotate([90,0,0]) cylinder(h=1.8, r=0.15, $fn=40);
    translate([0,-0.1,-2.8]) rotate([90,0,0]) cylinder(h=1.8, r=0.3, $fn=40);
    translate([0,0.1,-2.8]) rotate([90,0,0]) cylinder(h=1.8, r=0.15, $fn=40);


}
